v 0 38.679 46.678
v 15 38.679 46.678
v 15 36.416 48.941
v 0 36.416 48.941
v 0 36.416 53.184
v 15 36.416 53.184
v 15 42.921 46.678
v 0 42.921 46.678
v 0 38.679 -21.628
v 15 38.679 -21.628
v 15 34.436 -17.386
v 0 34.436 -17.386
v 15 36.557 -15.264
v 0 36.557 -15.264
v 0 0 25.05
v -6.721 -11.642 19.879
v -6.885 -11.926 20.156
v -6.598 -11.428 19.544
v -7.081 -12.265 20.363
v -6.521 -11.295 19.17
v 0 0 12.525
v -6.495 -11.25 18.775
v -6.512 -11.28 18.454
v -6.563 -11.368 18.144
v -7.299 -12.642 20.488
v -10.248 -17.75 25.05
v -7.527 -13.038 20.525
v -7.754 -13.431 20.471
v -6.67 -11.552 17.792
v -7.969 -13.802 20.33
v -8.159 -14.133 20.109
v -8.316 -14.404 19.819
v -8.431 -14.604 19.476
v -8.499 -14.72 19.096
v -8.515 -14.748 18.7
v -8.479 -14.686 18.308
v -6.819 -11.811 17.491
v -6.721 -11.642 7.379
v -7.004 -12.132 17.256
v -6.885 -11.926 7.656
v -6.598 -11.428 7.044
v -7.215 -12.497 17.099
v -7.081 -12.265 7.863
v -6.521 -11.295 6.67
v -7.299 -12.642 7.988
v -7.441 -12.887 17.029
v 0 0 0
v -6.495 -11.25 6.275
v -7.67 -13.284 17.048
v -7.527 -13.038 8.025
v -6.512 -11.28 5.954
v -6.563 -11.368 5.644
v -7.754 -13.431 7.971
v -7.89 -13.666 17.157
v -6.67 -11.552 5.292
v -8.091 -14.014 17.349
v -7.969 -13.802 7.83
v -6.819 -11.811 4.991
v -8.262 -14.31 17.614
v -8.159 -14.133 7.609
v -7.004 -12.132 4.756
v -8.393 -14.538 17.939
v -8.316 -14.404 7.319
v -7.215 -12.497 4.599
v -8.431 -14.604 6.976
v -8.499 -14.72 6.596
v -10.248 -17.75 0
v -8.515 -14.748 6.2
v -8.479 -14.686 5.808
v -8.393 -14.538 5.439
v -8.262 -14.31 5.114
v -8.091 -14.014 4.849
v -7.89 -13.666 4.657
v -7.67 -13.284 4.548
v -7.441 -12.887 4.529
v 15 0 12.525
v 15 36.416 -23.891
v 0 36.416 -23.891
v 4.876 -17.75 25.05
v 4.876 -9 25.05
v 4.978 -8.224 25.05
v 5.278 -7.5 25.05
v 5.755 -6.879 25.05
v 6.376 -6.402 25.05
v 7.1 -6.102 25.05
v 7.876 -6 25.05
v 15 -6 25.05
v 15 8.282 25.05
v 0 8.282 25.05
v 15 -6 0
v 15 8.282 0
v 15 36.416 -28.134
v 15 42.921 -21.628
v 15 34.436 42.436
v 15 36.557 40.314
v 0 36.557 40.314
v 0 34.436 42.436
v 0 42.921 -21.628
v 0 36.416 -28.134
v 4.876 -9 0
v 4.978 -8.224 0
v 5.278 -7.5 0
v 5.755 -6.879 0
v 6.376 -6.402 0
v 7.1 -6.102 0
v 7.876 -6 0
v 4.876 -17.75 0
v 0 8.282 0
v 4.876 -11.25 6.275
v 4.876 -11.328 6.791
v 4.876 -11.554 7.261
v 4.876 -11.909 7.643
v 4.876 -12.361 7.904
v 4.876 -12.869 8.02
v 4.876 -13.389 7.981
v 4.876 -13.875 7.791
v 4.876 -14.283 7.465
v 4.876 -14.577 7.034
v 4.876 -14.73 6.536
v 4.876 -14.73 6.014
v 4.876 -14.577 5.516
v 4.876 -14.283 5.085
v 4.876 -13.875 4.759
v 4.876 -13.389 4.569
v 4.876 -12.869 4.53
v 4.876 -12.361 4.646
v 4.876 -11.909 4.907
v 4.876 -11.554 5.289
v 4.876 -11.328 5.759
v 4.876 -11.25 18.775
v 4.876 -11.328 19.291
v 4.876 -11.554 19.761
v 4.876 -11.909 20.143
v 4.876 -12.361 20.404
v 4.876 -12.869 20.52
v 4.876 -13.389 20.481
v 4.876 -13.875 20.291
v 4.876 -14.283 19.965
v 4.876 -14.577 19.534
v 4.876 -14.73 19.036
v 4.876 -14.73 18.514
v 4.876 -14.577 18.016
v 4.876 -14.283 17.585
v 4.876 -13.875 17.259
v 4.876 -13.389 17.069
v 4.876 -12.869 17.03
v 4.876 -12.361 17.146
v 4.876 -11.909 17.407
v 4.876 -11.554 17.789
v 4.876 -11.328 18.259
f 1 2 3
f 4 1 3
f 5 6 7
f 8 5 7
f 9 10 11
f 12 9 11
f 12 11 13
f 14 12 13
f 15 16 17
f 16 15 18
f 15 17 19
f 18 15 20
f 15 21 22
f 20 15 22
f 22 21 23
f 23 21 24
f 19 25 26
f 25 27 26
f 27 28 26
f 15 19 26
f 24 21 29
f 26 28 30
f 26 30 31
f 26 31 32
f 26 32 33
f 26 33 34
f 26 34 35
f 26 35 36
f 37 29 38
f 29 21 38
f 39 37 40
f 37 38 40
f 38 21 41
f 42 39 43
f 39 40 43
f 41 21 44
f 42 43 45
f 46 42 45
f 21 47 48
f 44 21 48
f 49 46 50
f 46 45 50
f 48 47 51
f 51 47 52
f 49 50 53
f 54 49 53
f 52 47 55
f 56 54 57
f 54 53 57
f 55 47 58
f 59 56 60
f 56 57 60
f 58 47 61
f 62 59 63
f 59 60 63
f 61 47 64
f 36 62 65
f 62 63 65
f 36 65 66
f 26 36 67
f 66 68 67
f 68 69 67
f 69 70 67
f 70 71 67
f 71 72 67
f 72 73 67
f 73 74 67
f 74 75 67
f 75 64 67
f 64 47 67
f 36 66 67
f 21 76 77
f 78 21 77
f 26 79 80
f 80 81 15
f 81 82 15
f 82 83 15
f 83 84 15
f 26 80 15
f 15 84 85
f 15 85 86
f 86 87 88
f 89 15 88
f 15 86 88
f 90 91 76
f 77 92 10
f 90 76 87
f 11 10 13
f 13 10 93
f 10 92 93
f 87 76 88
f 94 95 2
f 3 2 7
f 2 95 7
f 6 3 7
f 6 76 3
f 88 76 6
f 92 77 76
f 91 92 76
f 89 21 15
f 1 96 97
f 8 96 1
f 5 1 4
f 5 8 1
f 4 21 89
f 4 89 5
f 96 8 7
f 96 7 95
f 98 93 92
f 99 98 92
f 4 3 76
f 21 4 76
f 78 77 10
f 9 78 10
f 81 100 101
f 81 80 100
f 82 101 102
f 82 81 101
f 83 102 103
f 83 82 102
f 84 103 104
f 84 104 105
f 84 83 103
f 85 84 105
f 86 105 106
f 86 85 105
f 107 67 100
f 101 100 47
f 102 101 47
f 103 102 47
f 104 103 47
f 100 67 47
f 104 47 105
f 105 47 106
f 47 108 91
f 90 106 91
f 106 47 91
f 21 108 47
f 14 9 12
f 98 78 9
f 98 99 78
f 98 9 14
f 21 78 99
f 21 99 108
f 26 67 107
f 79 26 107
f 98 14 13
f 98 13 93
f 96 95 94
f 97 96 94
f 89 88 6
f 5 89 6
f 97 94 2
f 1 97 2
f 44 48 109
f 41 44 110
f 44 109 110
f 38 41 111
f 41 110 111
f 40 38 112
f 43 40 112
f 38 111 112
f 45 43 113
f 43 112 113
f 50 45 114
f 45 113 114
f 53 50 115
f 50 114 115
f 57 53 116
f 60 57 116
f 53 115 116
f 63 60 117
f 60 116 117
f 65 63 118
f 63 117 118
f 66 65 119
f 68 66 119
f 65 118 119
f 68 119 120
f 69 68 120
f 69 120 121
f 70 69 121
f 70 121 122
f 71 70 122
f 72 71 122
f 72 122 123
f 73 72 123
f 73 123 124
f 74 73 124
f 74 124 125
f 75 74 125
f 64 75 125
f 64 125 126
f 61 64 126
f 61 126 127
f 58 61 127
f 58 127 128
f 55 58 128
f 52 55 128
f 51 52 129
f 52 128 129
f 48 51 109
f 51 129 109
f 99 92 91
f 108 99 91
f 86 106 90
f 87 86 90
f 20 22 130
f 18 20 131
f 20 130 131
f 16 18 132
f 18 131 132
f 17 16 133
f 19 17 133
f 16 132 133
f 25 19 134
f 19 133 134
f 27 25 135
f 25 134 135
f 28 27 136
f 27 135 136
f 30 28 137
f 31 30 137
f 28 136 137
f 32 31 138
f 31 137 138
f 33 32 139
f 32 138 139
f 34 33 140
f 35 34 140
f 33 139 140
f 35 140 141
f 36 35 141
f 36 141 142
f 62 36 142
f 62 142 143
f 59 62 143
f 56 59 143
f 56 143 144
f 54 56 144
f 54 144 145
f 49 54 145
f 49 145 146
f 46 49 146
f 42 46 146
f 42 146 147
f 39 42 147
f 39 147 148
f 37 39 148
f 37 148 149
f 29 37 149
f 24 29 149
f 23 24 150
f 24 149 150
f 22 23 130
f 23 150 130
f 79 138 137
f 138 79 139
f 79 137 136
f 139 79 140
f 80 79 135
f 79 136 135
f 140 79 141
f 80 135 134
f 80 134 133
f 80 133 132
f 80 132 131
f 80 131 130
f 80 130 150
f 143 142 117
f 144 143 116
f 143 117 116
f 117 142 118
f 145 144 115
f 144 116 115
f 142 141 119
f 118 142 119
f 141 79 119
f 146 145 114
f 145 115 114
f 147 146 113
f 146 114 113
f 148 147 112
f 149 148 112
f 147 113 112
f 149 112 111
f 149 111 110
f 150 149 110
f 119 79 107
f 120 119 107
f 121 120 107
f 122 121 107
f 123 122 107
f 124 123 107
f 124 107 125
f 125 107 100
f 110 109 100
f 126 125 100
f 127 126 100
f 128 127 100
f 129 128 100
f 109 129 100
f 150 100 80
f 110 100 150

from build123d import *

# Parameters (mm, degrees)
BOSS_EXTRUDE1_DEPTH = 25.05
SKETCH3_R           = 1.75
CUT_EXTRUDE2_DEPTH  = 35.224258664
FILLET1_R           = 3
BOSS_EXTRUDE2_DEPTH = 15


with BuildPart() as part:
    # Sketch1 → Boss-Extrude1 (new body)
    with BuildSketch(Plane.XY):
        Polygon((0, 0), (-10.247967278, -17.75), (4.876016361, -17.75), (4.876016361, -6), (15, -6), (15, 0), align=None)
    extrude(amount=BOSS_EXTRUDE1_DEPTH)

    # Sketch3 → Cut-Extrude2 (cut, through all)
    with BuildSketch(Plane(origin=(4.876016361, 0, 0), x_dir=(0, 0, -1), z_dir=(1, 0, 0))):
        with Locations(Location((-18.775, -13, 0), (0, 0, 90))):
            Circle(SKETCH3_R)
        with Locations(Location((-6.275, -13, 0), (0, 0, 90))):
            Circle(SKETCH3_R)
    extrude(amount=-CUT_EXTRUDE2_DEPTH, mode=Mode.SUBTRACT)

    # Fillet1
    fillet1_edges = [part.edges().sort_by_distance(p)[0] for p in [
        (4.876016361, -6, 12.525),
    ]]
    fillet(fillet1_edges, radius=FILLET1_R)

    # Sketch4 → Boss-Extrude2 (add)
    with BuildSketch(Plane(origin=(15, 0, 0), x_dir=(0, 0, -1), z_dir=(1, 0, 0))):
        Polygon((-25.05, 8.282359313), (-53.183639918, 36.415999231), (-46.678257531, 42.921381618), (-40.314296501, 36.557420587), (-42.435616844, 34.436100244), (-46.678257531, 38.678740931), (-48.940999231, 36.415999231), (-12.525, 0), (23.890999231, 36.415999231), (21.628257531, 38.678740931), (17.385616844, 34.436100244), (15.264296501, 36.557420587), (21.628257531, 42.921381618), (28.133639918, 36.415999231), (0, 8.282359313), (0, -6), (-25.05, -6), align=None)
    extrude(amount=-BOSS_EXTRUDE2_DEPTH)


solid = part.part
